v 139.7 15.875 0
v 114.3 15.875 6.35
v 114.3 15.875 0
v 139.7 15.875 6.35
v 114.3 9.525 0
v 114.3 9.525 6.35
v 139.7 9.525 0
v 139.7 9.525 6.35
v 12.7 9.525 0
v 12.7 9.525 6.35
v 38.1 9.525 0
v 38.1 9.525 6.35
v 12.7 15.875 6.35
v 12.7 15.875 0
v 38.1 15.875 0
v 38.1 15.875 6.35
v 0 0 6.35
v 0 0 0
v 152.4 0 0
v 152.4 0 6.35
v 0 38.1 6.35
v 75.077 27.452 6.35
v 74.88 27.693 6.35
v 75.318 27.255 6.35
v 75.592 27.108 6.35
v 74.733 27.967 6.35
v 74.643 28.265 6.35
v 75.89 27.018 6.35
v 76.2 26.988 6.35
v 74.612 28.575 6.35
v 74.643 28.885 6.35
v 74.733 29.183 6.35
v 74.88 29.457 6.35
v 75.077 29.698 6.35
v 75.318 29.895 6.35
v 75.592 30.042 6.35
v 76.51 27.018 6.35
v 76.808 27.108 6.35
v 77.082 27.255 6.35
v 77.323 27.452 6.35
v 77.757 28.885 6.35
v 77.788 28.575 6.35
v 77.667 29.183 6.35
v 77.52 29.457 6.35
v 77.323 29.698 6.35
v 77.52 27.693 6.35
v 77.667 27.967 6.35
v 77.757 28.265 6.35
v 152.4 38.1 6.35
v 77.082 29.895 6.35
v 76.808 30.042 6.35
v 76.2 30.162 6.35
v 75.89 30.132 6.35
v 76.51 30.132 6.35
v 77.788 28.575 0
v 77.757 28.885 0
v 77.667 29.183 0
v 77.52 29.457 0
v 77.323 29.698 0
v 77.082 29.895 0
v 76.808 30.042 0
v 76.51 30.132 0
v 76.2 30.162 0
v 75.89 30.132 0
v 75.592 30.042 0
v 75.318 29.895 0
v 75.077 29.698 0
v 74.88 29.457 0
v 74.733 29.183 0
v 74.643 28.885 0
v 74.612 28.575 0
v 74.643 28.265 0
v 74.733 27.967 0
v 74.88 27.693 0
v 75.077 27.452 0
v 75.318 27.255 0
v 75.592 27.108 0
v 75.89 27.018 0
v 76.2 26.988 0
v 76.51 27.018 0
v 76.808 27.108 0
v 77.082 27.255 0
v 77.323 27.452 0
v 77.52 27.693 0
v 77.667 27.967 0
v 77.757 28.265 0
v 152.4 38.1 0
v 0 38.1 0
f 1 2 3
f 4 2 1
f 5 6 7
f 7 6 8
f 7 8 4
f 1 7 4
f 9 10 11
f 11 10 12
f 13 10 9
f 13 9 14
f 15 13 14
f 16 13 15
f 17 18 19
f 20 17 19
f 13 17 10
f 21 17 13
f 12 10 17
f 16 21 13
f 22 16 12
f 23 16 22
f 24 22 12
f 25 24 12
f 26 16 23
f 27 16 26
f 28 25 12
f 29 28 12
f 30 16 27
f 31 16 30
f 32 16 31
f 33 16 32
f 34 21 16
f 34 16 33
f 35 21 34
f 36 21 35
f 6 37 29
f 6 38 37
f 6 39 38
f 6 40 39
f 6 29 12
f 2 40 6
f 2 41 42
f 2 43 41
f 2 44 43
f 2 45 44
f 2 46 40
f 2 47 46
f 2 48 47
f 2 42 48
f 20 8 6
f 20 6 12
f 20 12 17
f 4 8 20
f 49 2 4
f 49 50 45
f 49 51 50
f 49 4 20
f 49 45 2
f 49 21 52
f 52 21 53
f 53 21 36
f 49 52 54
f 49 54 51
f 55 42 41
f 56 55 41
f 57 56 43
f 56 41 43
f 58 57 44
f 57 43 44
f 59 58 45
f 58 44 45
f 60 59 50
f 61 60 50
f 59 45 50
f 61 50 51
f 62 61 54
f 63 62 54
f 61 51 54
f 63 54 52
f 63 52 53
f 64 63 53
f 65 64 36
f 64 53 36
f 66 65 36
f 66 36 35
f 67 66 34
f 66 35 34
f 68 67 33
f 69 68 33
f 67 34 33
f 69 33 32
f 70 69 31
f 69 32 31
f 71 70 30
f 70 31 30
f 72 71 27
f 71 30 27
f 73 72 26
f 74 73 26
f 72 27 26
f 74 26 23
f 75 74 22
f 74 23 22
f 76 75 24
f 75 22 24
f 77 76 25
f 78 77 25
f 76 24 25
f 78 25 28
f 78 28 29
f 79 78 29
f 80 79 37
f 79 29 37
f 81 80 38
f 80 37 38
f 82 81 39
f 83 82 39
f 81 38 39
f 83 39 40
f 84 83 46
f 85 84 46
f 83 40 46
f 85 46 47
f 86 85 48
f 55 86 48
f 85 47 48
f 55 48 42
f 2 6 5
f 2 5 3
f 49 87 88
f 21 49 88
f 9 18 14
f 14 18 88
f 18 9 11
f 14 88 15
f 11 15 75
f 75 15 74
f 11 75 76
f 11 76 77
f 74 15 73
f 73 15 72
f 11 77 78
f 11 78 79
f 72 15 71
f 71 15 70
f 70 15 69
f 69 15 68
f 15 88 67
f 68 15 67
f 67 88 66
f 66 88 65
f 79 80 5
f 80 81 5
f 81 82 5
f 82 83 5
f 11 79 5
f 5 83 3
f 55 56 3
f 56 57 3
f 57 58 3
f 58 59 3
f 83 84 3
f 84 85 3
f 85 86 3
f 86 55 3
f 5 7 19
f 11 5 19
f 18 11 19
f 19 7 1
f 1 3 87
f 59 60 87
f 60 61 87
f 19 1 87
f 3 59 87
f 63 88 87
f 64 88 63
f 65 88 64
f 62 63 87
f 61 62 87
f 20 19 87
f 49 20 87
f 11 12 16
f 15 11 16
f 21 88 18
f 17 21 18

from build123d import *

# Parameters (mm, degrees)
BOSS_EXTRUDE1_DEPTH = 6.35
SKETCH2_W           = 25.4
SKETCH2_H           = 6.35
CUT_EXTRUDE1_DEPTH  = 6.35
SKETCH3_W           = 25.4
SKETCH3_H           = 6.35
CUT_EXTRUDE2_DEPTH  = 6.35
SKETCH4_R           = 1.5875
CUT_EXTRUDE4_DEPTH  = 6.35


with BuildPart() as part:
    # Sketch1 → Boss-Extrude1 (new body)
    with BuildSketch(Plane.XY):
        Polygon((6.35, 38.1), (0, 38.1), (0, 25.4), (0, 12.7), (0, 0), (6.35, 0), (146.05, 0), (152.4, 0), (152.4, 12.7), (152.4, 25.4), (152.4, 38.1), (146.05, 38.1), align=None)
    extrude(amount=BOSS_EXTRUDE1_DEPTH)

    # Sketch2 → Cut-Extrude1 (cut)
    with BuildSketch(Plane.XY.offset(6.35)):
        with Locations((25.4, 12.7)):
            Rectangle(SKETCH2_W, SKETCH2_H)
    extrude(amount=-CUT_EXTRUDE1_DEPTH, mode=Mode.SUBTRACT)

    # Sketch3 → Cut-Extrude2 (cut)
    with BuildSketch(Plane.XY.offset(6.35)):
        with Locations((127, 12.7)):
            Rectangle(SKETCH3_W, SKETCH3_H)
    extrude(amount=-CUT_EXTRUDE2_DEPTH, mode=Mode.SUBTRACT)

    # Sketch4 → Cut-Extrude4 (cut)
    with BuildSketch(Plane.XY.offset(6.35)):
        with Locations((76.2, 28.575)):
            Circle(SKETCH4_R)
    extrude(amount=-CUT_EXTRUDE4_DEPTH, mode=Mode.SUBTRACT)


solid = part.part
